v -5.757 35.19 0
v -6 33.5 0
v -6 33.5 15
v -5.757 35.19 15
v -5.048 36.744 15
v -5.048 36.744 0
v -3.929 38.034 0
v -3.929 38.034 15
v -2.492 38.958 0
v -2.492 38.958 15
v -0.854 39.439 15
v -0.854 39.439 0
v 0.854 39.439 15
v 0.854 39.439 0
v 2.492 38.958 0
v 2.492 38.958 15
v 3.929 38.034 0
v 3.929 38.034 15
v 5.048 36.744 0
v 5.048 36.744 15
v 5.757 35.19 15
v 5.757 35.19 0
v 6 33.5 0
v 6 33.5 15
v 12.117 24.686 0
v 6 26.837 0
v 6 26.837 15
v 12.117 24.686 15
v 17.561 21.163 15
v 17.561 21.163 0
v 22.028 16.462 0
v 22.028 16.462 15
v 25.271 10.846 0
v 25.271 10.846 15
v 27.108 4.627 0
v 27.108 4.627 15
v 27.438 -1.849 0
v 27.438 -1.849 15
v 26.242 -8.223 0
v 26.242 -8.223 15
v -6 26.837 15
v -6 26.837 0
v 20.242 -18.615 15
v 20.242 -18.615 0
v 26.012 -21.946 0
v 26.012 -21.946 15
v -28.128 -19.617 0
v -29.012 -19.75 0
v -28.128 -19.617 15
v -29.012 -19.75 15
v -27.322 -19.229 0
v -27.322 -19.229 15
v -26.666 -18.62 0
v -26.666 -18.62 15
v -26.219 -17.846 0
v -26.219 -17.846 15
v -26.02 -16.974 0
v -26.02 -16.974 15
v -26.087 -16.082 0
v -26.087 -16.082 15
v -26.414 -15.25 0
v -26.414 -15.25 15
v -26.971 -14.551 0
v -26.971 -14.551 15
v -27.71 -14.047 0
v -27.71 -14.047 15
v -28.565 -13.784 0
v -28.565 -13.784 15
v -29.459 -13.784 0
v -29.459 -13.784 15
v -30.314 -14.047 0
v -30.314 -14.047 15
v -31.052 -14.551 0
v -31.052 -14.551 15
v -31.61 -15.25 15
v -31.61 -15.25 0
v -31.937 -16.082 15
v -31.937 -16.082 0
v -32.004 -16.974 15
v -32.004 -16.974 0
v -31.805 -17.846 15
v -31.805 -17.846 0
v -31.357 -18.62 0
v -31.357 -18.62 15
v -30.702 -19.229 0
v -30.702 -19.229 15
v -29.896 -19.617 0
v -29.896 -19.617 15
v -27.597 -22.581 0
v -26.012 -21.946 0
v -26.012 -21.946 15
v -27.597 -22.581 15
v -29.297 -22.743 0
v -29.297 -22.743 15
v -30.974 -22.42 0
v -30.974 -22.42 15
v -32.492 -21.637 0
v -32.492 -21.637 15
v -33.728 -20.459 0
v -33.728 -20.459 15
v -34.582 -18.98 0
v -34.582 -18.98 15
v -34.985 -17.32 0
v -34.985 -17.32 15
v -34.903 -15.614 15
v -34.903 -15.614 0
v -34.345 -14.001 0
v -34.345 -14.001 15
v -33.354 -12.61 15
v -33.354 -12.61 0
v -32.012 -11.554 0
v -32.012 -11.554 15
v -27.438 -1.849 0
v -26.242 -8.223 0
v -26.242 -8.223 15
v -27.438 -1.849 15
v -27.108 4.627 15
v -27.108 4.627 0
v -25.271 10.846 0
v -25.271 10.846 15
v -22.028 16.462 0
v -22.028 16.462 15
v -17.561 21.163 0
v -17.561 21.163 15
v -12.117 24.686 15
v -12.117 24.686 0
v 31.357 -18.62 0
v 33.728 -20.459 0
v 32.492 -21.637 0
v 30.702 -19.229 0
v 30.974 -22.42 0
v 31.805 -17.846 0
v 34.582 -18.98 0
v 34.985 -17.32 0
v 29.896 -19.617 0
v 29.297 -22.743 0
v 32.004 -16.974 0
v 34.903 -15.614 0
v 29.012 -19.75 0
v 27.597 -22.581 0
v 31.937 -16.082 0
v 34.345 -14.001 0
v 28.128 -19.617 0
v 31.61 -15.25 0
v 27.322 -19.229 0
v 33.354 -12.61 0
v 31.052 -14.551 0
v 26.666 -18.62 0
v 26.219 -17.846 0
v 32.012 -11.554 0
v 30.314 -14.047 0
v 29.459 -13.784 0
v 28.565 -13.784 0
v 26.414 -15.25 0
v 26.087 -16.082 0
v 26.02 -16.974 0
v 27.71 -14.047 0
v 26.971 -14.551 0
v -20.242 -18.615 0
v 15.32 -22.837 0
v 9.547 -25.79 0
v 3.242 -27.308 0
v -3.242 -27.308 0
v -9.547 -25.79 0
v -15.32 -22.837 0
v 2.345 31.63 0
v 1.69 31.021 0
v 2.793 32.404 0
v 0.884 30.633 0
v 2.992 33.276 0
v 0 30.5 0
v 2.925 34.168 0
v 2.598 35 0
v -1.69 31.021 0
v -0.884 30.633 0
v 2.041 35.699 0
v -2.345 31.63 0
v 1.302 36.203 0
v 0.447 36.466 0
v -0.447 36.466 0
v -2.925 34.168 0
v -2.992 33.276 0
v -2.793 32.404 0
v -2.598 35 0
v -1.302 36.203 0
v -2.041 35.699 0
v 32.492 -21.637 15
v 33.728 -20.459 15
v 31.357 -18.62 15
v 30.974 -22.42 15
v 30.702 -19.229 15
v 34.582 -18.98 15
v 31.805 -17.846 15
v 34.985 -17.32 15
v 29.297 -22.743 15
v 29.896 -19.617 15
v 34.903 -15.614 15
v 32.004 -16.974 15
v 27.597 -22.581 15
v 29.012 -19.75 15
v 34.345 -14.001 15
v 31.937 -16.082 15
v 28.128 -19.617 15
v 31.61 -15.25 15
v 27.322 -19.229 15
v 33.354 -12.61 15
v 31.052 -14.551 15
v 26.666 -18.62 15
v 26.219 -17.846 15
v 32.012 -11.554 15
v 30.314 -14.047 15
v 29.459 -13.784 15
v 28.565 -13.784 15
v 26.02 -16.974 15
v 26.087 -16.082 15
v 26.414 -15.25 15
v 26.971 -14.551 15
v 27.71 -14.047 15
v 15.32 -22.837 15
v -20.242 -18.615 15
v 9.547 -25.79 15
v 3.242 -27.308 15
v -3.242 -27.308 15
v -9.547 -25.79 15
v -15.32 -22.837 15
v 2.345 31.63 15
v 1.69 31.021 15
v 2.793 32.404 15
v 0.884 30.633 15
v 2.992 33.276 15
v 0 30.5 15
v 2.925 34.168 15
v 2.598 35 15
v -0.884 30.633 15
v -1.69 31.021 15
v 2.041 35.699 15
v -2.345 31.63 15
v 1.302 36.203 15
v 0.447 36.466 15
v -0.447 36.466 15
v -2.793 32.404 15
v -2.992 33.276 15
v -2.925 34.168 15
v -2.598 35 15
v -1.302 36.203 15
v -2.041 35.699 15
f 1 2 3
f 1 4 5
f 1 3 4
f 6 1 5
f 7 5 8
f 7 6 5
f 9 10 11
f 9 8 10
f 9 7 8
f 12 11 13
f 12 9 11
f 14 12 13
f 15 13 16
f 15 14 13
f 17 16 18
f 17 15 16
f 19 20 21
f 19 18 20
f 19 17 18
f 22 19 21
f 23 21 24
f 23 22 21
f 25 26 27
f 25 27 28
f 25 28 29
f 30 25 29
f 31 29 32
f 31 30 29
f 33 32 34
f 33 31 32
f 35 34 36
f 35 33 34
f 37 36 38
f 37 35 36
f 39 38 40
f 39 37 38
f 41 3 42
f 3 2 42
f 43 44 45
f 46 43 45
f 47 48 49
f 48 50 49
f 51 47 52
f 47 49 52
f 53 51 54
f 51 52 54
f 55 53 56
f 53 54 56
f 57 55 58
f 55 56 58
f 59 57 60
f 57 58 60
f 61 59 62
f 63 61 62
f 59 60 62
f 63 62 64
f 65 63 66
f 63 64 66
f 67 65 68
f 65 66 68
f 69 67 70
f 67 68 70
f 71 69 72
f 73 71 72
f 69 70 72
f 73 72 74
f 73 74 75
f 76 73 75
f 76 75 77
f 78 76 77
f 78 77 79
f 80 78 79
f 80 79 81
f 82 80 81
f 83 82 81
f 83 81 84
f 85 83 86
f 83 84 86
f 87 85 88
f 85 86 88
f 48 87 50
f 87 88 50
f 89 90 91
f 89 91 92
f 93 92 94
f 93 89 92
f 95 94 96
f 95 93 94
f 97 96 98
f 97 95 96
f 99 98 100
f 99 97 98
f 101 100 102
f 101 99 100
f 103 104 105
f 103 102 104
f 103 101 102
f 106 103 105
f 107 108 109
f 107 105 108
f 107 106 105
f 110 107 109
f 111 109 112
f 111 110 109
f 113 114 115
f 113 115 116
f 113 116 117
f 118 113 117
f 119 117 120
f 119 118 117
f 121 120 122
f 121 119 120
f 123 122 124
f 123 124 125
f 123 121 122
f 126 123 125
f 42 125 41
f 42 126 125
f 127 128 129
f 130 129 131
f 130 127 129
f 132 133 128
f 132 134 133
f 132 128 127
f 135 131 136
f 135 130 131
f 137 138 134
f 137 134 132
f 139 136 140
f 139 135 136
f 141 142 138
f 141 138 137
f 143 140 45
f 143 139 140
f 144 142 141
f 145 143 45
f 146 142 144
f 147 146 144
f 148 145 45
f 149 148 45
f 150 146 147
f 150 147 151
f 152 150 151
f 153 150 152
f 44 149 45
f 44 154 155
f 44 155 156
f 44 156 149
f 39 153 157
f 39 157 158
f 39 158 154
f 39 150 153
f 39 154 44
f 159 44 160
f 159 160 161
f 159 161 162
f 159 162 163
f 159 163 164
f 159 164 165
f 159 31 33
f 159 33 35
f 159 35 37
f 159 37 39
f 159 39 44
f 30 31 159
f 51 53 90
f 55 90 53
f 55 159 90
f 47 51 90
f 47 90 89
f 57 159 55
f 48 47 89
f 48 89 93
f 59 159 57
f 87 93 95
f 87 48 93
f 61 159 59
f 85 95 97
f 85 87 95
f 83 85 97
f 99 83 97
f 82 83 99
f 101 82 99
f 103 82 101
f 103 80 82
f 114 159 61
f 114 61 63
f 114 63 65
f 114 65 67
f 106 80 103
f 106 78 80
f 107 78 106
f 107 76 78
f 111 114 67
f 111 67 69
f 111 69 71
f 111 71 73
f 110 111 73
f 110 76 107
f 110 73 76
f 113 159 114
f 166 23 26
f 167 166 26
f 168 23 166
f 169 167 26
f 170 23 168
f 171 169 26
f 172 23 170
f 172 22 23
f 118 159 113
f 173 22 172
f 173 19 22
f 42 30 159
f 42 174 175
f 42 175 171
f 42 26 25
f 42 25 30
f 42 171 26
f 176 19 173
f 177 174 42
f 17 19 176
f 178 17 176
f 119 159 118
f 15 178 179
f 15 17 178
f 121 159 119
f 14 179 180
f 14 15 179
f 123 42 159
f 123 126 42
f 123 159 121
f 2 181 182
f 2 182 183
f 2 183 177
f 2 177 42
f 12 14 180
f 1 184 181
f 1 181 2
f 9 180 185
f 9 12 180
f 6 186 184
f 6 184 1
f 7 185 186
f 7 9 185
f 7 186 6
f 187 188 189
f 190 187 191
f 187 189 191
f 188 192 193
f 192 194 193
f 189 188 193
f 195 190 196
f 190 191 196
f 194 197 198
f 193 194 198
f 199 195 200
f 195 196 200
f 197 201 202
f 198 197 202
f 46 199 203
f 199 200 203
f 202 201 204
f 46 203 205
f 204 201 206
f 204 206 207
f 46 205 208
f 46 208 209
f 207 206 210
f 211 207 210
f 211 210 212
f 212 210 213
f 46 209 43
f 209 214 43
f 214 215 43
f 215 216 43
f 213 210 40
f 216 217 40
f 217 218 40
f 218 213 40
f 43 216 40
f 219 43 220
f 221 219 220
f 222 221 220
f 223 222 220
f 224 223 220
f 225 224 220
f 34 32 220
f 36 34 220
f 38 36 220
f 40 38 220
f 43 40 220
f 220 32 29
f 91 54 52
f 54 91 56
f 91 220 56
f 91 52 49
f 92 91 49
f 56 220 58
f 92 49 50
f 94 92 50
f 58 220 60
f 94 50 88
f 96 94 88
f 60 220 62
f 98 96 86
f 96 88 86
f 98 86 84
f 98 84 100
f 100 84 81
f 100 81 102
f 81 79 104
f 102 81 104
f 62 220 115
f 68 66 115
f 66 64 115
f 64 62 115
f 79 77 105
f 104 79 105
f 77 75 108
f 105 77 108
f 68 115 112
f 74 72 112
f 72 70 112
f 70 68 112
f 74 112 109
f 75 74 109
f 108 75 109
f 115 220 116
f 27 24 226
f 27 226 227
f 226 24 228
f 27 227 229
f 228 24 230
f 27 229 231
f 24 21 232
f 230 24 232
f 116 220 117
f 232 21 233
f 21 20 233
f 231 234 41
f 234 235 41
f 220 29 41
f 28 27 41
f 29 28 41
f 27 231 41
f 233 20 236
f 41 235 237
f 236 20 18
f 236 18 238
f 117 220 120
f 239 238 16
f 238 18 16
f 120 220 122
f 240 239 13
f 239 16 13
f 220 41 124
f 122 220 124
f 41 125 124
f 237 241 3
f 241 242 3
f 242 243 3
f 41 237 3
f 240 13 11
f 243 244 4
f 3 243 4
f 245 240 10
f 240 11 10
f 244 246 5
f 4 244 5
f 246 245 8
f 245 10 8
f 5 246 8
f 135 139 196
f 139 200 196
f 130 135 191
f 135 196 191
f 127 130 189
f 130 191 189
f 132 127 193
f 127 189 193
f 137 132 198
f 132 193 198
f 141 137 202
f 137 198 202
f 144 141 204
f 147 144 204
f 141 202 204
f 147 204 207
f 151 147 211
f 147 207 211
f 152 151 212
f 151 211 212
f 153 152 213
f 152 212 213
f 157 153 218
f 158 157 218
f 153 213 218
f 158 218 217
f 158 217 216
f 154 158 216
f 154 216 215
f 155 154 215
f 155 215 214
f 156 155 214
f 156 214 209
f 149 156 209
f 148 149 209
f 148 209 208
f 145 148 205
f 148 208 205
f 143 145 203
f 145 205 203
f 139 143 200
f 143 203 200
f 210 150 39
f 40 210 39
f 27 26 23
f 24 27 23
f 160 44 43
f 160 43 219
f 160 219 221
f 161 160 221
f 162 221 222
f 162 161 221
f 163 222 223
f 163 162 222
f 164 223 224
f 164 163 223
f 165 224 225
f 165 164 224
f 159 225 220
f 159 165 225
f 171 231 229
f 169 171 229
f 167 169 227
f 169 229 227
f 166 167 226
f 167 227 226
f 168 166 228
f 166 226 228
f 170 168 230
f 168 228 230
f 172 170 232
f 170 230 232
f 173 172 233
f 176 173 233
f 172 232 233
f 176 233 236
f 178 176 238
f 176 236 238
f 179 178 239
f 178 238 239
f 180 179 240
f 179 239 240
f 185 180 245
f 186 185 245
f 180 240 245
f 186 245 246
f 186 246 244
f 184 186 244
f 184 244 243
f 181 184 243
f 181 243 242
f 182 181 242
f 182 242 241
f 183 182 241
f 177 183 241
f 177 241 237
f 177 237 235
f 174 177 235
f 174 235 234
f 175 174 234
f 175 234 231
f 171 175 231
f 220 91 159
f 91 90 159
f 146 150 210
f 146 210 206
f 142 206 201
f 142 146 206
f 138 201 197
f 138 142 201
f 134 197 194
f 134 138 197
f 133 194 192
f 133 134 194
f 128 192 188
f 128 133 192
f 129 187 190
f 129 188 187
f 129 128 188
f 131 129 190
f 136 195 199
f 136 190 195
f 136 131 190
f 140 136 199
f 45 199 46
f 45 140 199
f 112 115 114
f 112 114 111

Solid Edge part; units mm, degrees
sketch "Sketch1" plane through (0, 0, 0) normal (0, 0, 1) x (1, 0, 0)
  arc A0 (-26.2419, -8.2226) -> (-6, 26.8375) centre (0, 0) cw
  line L0 (-6, 33.5) -> (-6, 26.8375)
  arc A1 (6, 33.5) -> (-6, 33.5) centre (0, 33.5) ccw
  line L1 (6, 26.8375) -> (6, 33.5)
  arc A2 (6, 26.8375) -> (26.2419, -8.2226) centre (0, 0) cw
  line L2 (32.0119, -11.5538) -> (26.2419, -8.2226)
  arc A3 (26.0119, -21.9462) -> (32.0119, -11.5538) centre (29.0119, -16.75) ccw
  line L3 (20.2419, -18.6149) -> (26.0119, -21.9462)
  arc A4 (20.2419, -18.6149) -> (-20.2419, -18.6149) centre (0, 0) cw
  line L4 (-26.0119, -21.9462) -> (-20.2419, -18.6149)
  arc A5 (-32.0119, -11.5538) -> (-26.0119, -21.9462) centre (-29.0119, -16.75) ccw
  line L5 (-26.2419, -8.2226) -> (-32.0119, -11.5538)
extrude "Protrusion1" add sketch "Sketch1" along normal blind 15
hole "Bohrung_1" at (29.0119, -16.75, 15) direction (0, 0, -1) diameter 6 end through all
hole "Hole1" at (-29.0119, -16.75, 15) direction (0, 0, -1) diameter 6 end through all
hole "Hole2" at (0, 33.5, 15) direction (0, 0, -1) diameter 6 end through all
properties part number "DV5" material "Gelbmessing"
